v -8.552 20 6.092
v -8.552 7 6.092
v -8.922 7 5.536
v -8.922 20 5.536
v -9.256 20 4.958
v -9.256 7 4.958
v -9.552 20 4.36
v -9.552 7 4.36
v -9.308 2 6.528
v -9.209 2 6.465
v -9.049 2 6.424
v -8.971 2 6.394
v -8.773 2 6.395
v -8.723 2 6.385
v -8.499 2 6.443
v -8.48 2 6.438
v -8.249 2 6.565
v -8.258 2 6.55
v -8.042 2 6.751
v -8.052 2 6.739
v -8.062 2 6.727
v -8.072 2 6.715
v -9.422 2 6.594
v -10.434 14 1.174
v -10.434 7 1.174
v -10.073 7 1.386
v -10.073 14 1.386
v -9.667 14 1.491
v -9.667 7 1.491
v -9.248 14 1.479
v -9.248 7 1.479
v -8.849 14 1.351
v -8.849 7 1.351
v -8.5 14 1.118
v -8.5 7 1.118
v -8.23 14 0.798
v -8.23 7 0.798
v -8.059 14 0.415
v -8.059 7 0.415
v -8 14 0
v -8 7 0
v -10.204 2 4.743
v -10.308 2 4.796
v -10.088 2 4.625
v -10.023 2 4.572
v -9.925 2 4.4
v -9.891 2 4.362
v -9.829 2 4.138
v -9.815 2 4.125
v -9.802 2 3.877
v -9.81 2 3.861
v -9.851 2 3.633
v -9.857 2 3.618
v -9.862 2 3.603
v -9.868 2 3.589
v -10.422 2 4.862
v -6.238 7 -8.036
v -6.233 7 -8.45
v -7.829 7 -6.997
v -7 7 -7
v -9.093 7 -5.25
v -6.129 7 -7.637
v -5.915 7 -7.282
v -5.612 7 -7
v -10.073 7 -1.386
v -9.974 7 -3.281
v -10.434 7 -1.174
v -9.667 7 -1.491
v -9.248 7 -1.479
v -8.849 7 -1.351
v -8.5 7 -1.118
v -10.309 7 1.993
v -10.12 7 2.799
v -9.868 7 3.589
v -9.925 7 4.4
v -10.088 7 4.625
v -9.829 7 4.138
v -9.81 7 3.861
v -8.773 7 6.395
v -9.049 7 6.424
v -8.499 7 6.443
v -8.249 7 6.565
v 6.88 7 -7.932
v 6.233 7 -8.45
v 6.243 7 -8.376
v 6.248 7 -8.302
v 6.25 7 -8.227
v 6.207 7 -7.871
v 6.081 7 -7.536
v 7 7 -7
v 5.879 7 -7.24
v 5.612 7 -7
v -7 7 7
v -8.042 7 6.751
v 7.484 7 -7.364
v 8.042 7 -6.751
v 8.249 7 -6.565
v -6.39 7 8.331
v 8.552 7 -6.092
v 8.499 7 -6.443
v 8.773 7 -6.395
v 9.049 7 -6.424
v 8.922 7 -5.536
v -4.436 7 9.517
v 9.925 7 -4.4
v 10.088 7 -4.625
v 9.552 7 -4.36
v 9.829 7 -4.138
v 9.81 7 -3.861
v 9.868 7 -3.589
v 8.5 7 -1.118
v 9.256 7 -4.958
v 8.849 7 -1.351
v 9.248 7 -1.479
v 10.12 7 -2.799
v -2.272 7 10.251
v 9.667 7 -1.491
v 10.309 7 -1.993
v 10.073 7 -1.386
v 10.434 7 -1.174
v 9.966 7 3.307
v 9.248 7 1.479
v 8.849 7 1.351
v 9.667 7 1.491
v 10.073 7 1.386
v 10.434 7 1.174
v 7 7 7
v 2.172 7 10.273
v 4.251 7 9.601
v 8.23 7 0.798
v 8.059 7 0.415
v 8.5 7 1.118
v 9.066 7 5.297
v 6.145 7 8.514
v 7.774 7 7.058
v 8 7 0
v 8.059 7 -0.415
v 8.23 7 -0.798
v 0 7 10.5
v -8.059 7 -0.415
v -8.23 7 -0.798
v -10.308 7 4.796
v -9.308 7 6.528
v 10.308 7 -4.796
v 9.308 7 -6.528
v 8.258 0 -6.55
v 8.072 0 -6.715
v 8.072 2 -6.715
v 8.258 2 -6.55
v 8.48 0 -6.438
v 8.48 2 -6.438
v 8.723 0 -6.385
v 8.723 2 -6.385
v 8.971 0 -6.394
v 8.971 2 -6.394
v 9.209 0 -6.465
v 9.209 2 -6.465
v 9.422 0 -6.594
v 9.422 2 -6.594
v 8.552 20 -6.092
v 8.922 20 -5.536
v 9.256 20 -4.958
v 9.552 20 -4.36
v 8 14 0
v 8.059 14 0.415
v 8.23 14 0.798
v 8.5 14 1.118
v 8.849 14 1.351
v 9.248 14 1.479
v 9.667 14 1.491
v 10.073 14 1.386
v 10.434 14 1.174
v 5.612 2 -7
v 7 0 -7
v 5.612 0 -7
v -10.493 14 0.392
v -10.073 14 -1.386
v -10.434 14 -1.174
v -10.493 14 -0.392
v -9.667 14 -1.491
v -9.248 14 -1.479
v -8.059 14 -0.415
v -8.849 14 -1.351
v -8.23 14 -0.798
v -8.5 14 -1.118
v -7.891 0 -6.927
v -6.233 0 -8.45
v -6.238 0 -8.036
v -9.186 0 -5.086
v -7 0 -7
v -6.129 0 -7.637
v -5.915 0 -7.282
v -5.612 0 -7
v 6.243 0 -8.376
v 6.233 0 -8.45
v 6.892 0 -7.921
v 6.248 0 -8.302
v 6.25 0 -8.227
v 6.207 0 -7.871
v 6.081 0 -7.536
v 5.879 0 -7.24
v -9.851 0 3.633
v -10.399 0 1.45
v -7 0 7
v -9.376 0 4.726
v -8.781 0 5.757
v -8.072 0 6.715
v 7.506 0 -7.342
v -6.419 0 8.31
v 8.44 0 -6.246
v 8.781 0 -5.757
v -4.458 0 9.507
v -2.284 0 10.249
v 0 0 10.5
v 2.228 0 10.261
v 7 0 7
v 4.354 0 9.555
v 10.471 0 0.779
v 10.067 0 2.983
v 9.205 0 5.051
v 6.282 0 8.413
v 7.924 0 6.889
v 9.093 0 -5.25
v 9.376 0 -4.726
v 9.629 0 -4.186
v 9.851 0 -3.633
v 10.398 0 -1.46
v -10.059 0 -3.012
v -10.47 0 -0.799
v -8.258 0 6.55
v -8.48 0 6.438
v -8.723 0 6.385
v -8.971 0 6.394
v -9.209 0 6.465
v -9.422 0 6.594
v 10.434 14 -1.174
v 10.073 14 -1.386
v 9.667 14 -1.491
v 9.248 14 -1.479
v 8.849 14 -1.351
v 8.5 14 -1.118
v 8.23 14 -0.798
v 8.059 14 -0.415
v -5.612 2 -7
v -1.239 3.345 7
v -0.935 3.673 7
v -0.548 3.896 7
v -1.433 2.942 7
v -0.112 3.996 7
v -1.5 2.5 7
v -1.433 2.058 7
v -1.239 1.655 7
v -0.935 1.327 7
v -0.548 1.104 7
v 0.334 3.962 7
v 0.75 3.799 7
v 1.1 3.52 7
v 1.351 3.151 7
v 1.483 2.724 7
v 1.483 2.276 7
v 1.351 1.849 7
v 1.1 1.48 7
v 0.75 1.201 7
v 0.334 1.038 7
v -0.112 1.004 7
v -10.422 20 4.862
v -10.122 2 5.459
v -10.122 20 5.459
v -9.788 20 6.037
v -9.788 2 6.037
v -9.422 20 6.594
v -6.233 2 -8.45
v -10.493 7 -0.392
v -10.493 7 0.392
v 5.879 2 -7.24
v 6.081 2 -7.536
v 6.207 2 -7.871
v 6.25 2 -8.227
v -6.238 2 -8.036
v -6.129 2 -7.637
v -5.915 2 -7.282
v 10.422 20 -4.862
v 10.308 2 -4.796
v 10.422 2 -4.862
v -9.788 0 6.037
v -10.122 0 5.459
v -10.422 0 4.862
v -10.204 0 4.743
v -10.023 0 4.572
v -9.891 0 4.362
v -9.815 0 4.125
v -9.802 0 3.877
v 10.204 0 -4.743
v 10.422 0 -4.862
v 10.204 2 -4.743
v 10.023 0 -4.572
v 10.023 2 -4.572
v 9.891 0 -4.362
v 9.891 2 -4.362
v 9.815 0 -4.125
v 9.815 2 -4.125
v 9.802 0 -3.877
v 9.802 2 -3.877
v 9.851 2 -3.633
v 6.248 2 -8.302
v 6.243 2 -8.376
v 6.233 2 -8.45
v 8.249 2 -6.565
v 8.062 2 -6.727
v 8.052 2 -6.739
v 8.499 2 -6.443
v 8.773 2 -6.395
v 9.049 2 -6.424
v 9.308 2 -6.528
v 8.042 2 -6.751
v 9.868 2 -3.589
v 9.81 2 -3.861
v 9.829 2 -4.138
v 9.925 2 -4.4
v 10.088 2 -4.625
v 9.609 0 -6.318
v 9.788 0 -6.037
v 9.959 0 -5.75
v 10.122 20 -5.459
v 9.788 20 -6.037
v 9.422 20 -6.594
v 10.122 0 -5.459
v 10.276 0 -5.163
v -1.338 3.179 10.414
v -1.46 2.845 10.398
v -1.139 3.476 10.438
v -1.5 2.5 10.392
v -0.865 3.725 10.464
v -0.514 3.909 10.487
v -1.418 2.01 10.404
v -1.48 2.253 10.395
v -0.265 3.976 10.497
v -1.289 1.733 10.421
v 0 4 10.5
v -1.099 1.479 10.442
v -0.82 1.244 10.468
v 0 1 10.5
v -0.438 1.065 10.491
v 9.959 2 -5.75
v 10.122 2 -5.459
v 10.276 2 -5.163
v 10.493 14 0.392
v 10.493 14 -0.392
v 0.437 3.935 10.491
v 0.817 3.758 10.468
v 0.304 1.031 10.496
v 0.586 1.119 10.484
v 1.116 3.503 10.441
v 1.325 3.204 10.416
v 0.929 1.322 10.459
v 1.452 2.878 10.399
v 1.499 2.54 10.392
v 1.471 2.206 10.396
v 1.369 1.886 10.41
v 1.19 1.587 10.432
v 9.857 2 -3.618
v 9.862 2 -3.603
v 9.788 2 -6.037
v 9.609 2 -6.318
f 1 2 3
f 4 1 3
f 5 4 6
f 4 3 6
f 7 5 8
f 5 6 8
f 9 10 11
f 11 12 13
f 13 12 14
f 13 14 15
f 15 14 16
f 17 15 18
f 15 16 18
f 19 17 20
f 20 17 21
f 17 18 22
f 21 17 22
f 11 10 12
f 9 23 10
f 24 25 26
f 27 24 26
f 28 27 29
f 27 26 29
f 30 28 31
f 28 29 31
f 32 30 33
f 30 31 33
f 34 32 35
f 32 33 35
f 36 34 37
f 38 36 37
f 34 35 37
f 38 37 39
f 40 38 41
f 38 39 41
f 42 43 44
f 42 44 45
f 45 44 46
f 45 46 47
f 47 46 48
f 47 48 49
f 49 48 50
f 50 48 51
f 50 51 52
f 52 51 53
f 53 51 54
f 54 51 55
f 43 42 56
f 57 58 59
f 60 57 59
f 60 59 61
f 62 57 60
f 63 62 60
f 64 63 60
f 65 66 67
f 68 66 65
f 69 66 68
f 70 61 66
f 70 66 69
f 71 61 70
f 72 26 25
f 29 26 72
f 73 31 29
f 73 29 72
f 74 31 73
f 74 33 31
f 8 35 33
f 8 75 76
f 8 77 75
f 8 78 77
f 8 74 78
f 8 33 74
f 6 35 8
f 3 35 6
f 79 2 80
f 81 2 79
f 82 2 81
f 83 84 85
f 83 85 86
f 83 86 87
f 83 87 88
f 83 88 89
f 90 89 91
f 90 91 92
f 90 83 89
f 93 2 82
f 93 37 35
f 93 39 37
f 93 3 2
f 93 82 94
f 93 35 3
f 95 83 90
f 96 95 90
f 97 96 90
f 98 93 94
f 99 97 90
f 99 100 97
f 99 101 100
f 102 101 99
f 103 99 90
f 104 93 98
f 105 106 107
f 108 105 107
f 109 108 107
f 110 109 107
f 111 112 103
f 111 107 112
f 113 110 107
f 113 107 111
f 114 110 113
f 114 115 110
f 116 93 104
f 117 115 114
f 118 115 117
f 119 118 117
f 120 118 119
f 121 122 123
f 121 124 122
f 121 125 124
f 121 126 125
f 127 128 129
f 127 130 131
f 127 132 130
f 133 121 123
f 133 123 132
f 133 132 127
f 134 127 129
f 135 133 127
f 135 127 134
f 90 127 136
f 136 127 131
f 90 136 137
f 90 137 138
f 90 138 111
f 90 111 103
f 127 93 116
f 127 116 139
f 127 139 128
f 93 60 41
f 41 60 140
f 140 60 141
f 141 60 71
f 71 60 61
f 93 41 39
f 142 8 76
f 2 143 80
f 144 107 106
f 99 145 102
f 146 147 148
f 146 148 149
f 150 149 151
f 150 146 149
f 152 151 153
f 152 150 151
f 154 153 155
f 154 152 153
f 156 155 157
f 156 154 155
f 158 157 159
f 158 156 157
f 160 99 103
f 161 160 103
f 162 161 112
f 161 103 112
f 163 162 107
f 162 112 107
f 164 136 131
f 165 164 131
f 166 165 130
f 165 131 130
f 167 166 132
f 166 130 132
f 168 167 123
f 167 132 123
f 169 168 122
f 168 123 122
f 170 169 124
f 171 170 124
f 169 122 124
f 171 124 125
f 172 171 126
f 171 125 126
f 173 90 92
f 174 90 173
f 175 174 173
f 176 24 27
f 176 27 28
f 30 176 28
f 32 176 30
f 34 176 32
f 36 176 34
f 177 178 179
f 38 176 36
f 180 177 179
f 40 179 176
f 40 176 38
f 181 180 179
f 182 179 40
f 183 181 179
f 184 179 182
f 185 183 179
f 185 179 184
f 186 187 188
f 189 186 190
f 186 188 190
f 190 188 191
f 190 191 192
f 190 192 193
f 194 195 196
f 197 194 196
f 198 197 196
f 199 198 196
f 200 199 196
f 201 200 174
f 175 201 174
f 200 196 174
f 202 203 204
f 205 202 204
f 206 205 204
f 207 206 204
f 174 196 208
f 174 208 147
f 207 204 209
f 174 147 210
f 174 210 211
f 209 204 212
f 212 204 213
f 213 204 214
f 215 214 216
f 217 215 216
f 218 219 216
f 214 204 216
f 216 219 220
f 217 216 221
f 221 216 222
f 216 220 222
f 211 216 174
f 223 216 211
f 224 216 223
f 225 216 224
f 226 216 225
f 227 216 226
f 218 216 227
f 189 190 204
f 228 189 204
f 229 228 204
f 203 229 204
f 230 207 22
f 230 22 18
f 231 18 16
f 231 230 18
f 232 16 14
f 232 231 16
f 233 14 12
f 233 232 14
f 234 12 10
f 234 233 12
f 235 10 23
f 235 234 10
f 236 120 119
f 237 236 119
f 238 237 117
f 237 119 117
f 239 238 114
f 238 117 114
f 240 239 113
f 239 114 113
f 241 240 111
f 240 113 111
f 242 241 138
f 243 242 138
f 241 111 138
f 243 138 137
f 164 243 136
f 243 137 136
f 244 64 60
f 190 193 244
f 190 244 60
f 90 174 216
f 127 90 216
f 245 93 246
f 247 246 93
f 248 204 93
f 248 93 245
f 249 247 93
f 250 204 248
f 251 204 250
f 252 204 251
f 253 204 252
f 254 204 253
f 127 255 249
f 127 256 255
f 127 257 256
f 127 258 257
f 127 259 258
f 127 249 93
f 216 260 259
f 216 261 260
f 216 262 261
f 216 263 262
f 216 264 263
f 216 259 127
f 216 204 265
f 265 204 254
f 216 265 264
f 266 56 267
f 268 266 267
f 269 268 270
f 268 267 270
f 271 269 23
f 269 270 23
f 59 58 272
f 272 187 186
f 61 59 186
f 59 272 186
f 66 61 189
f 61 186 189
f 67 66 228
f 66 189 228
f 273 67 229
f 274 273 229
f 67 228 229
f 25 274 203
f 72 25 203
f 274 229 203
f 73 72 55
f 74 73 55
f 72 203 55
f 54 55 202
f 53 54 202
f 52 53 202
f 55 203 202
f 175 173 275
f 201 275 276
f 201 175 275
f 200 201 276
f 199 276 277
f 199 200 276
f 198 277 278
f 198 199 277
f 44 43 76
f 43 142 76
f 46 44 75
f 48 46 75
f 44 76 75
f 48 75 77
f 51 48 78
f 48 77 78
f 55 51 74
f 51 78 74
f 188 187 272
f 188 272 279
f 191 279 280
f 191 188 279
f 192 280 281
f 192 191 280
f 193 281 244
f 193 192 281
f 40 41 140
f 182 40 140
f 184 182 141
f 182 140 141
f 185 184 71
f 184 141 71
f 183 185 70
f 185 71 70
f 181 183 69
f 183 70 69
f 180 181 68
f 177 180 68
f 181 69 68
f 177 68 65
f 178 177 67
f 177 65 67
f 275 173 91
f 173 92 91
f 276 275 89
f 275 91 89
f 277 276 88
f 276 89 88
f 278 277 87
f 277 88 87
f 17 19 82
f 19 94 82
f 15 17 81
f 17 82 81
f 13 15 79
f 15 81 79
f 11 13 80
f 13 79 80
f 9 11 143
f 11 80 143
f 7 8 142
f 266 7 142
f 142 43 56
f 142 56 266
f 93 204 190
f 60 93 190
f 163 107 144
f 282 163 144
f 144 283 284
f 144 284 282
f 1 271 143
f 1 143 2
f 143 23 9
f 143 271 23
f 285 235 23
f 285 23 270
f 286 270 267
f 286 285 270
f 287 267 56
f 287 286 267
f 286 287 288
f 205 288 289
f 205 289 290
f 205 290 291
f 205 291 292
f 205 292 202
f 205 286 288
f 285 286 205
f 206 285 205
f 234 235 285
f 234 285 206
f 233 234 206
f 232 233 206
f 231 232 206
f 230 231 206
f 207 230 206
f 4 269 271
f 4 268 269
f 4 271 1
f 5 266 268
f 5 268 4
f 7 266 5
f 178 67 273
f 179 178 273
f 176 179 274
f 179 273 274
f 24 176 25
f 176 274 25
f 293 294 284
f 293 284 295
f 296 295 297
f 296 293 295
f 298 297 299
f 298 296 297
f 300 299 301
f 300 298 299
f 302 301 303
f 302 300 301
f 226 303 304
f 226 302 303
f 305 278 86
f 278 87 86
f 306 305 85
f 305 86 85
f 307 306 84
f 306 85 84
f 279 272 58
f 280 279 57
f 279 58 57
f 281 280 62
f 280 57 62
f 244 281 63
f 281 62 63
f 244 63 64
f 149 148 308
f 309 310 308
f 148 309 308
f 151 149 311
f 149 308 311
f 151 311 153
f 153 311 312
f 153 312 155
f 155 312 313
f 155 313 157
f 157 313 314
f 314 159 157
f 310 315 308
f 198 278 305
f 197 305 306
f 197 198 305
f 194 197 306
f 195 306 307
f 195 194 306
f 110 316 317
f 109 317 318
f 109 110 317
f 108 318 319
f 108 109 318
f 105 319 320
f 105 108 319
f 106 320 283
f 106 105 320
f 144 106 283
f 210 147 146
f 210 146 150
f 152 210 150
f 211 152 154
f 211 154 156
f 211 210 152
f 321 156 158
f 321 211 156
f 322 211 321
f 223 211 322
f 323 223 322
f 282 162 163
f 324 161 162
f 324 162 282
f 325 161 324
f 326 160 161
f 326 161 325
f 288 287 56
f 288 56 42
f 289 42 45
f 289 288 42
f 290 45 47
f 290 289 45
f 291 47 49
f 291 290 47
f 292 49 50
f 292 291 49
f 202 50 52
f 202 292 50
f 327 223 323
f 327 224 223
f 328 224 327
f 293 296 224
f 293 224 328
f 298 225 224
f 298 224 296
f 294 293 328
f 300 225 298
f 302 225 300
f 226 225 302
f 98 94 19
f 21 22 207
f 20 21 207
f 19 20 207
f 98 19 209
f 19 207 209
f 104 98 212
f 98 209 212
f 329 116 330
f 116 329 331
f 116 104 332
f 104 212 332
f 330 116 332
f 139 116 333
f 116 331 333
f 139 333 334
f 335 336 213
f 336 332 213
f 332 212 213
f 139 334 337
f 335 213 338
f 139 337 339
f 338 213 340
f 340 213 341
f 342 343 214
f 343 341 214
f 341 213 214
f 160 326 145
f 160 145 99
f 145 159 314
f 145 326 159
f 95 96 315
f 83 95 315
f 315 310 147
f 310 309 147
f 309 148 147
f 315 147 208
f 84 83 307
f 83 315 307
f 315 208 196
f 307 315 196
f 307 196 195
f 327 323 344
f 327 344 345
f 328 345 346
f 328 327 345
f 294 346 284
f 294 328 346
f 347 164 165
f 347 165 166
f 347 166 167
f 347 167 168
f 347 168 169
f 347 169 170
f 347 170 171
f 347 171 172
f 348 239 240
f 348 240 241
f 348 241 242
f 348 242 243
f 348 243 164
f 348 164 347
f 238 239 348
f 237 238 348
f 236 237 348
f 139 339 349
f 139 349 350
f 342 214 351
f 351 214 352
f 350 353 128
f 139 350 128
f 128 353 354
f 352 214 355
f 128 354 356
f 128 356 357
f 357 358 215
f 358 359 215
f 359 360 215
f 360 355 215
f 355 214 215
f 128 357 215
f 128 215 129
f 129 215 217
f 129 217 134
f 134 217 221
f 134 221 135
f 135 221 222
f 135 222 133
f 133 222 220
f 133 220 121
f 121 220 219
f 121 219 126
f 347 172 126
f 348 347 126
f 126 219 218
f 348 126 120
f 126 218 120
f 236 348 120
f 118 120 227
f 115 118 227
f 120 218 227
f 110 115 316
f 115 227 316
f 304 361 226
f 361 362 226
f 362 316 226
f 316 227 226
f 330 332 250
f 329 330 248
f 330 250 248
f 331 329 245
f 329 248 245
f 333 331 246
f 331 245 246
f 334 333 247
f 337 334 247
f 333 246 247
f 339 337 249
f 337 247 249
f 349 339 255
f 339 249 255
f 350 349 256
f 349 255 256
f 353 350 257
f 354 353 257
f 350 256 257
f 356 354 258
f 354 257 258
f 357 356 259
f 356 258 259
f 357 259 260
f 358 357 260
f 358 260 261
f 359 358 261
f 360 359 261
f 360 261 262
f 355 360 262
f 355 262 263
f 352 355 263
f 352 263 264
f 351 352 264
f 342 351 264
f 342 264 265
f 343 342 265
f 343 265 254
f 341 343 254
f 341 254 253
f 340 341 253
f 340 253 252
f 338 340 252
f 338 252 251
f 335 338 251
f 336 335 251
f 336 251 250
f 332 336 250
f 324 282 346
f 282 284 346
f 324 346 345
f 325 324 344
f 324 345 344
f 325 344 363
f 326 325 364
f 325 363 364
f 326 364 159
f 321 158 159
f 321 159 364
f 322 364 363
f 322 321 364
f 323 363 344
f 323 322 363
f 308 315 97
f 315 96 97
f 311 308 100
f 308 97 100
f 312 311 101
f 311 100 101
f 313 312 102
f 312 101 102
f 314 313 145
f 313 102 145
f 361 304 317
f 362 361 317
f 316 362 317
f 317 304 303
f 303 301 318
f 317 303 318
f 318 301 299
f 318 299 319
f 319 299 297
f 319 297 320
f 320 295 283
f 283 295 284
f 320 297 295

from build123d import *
from build123d.topology import SkipClean

# Parameters (mm, degrees)
SKETCH1_R               = 10.5
BOSS_EXTRUDE1_DEPTH     = 7
BOSS_EXTRUDE2_DEPTH     = 7
BOSS_EXTRUDE4_START     = -5
BOSS_EXTRUDE4_DEPTH     = 5
SKETCH5_R               = 1.5
CUT_EXTRUDE2_DEPTH      = 5
BOSS_EXTRUDE5_DEPTH     = 13
CUT_EXTRUDE4_DEPTH      = 26.013546021
CUT_EXTRUDE4_DEPTH_BACK = 26.013546021
FILLET1_R               = 1
CUT_EXTRUDE5_DEPTH      = 20.866491554
CUT_EXTRUDE5_DEPTH_BACK = 20.866491554
SKETCH9_R               = 15
SKETCH9_R_2             = 11.5
SKETCH10_R              = 1.5
CUT_EXTRUDE6_DEPTH      = 11.2
CUT_EXTRUDE7_DEPTH      = 24.334523869
CUT_EXTRUDE7_DEPTH_BACK = 24.334523869
SKETCH12_R              = 4.652991158
SKETCH12_R_2            = 1.5
BOSS_EXTRUDE6_START     = 2
BOSS_EXTRUDE6_DEPTH     = 2


with BuildPart() as part:
    # Sketch1 → Boss-Extrude1 (new body)
    with BuildSketch(Plane(origin=(0, 0, 0), x_dir=(1, 0, 0), z_dir=(0, 1, 0))):
        with Locations(Location((0, 0, 0), (0, 0, 270))):
            Circle(SKETCH1_R)
        Polygon((7, -7), (7, 0), (7, 7), (-7, 7), (-7, -7), align=None, mode=Mode.SUBTRACT)
    extrude(amount=BOSS_EXTRUDE1_DEPTH)

    # Sketch2 → Boss-Extrude2 (add)
    with BuildSketch(Plane(origin=(0, 7, 0), x_dir=(1, 0, 0), z_dir=(0, 1, 0))):
        with BuildLine():
            ThreePointArc((-10.434210526, -1.173563246), (-8.848584537, -1.351169084), (-8, 0))
            ThreePointArc((-8, 0), (-8.848584537, 1.351169084), (-10.434210526, 1.173563246))
            ThreePointArc((-10.434210526, 1.173563246), (-10.5, 0), (-10.434210526, -1.173563246))
        make_face()
        with BuildLine():
            ThreePointArc((10.434210526, 1.173563246), (8.848584537, 1.351169084), (8, 0))
            ThreePointArc((8, 0), (8.848584537, -1.351169084), (10.434210526, -1.173563246))
            ThreePointArc((10.434210526, -1.173563246), (10.5, 0), (10.434210526, 1.173563246))
        make_face()
    extrude(amount=BOSS_EXTRUDE2_DEPTH)

    # Sketch4 → Boss-Extrude4 (add)
    with BuildSketch(Plane(origin=(0, 7, 0), x_dir=(1, 0, 0), z_dir=(0, 1, 0)).offset(BOSS_EXTRUDE4_START)):
        with BuildLine():
            Line((-10.392304845, -6), (-9.09326674, -5.25))
            ThreePointArc((-9.09326674, -5.25), (-9.333212128, -4.810525062), (-9.551933495, -4.360110836))
            Line((-9.551933495, -4.360110836), (-10.743718377, -5.048188159))
            ThreePointArc((-10.743718377, -5.048188159), (-10.608541774, -5.539058011), (-10.392304845, -6))
        make_face()
        with BuildLine():
            Line((-9.09326674, -5.25), (-7, -4.041451884))
            Line((-7, -4.041451884), (-7, -2.886751346))
            Line((-7, -2.886751346), (-9.551933495, -4.360110836))
            ThreePointArc((-9.551933495, -4.360110836), (-9.333212128, -4.810525062), (-9.09326674, -5.25))
        make_face()
        with BuildLine():
            Line((-7, -5.196152423), (-7, -4.041451884))
            Line((-7, -4.041451884), (-9.09326674, -5.25))
            ThreePointArc((-9.09326674, -5.25), (-8.832642973, -5.677536271), (-8.551933495, -6.092161644))
            Line((-8.551933495, -6.092161644), (-7, -5.196152423))
        make_face()
        with BuildLine():
            ThreePointArc((-8.551933495, -6.092161644), (-8.832642973, -5.677536271), (-9.09326674, -5.25))
            Line((-9.09326674, -5.25), (-10.392304845, -6))
            ThreePointArc((-10.392304845, -6), (-10.101235838, -6.417737668), (-9.743718377, -6.780238966))
            Line((-9.743718377, -6.780238966), (-8.551933495, -6.092161644))
        make_face()
        with BuildLine():
            ThreePointArc((8.551933495, 6.092161644), (8.832642973, 5.677536271), (9.09326674, 5.25))
            Line((9.09326674, 5.25), (10.392304845, 6))
            ThreePointArc((10.392304845, 6), (10.101235838, 6.417737668), (9.743718377, 6.780238966))
            Line((9.743718377, 6.780238966), (8.551933495, 6.092161644))
        make_face()
        with BuildLine():
            Line((10.392304845, 6), (9.09326674, 5.25))
            ThreePointArc((9.09326674, 5.25), (9.333212128, 4.810525062), (9.551933495, 4.360110836))
            Line((9.551933495, 4.360110836), (10.743718377, 5.048188159))
            ThreePointArc((10.743718377, 5.048188159), (10.608541774, 5.539058011), (10.392304845, 6))
        make_face()
        with BuildLine():
            Line((7, 5.196152423), (7, 4.041451884))
            Line((7, 4.041451884), (9.09326674, 5.25))
            ThreePointArc((9.09326674, 5.25), (8.832642973, 5.677536271), (8.551933495, 6.092161644))
            Line((8.551933495, 6.092161644), (7, 5.196152423))
        make_face()
        with BuildLine():
            Line((9.09326674, 5.25), (7, 4.041451884))
            Line((7, 4.041451884), (7, 2.886751346))
            Line((7, 2.886751346), (9.551933495, 4.360110836))
            ThreePointArc((9.551933495, 4.360110836), (9.333212128, 4.810525062), (9.09326674, 5.25))
        make_face()
    extrude(amount=BOSS_EXTRUDE4_DEPTH)

    # Sketch5 → Cut-Extrude2 (cut)
    with BuildSketch(Plane(origin=(0, 7, 0), x_dir=(1, 0, 0), z_dir=(0, 1, 0))):
        with Locations((4.75, 8.227241336)):
            Circle(SKETCH5_R)
        with Locations((-4.75, 8.227241336)):
            Circle(SKETCH5_R)
    extrude(amount=-CUT_EXTRUDE2_DEPTH, mode=Mode.SUBTRACT)

    # Sketch6 → Boss-Extrude5 (add)
    with BuildSketch(Plane(origin=(0, 7, 0), x_dir=(1, 0, 0), z_dir=(0, 1, 0))):
        with BuildLine():
            Line((-9.551933495, -4.360110836), (-10.743718377, -5.048188159))
            ThreePointArc((-10.743718377, -5.048188159), (-10.392304845, -6), (-9.743718377, -6.780238966))
            Line((-9.743718377, -6.780238966), (-8.551933495, -6.092161644))
            ThreePointArc((-8.551933495, -6.092161644), (-9.09326674, -5.25), (-9.551933495, -4.360110836))
        make_face()
        with BuildLine():
            Line((9.743718377, 6.780238966), (8.551933495, 6.092161644))
            ThreePointArc((8.551933495, 6.092161644), (9.09326674, 5.25), (9.551933495, 4.360110836))
            Line((9.551933495, 4.360110836), (10.743718377, 5.048188159))
            ThreePointArc((10.743718377, 5.048188159), (10.392304845, 6), (9.743718377, 6.780238966))
        make_face()
    extrude(amount=BOSS_EXTRUDE5_DEPTH)

    # Sketch8 → Cut-Extrude4 (cut, two sides: drawn at the far end of the back side and taken through both)
    with BuildSketch(Plane.XY.offset(-CUT_EXTRUDE4_DEPTH_BACK)):
        with BuildLine():
            ThreePointArc((-1.216007768, 2.789525659), (-0.289525659, 1.283992232), (1.216007768, 2.210474341))
            Line((1.216007768, 2.210474341), (-1.216007768, 2.789525659))
        make_face()
        with BuildLine():
            Line((-1.216007768, 2.789525659), (1.216007768, 2.210474341))
            ThreePointArc((1.216007768, 2.210474341), (1.241472857, 2.354242857), (1.25, 2.5))
            ThreePointArc((1.25, 2.5), (0.145757143, 3.741472857), (-1.216007768, 2.789525659))
        make_face()
    extrude(amount=CUT_EXTRUDE4_DEPTH + CUT_EXTRUDE4_DEPTH_BACK, mode=Mode.SUBTRACT)

    # Fillet1
    fillet1_edges = [part.edges().sort_by_distance(p)[0] for p in [
        (-8.551933495, 4.5, 6.092161644),
        (-9.551933495, 4.5, 4.360110836),
        (8.551933495, 4.5, -6.092161644),
        (9.551933495, 4.5, -4.360110836),
    ]]
    fillet(fillet1_edges, radius=FILLET1_R)

    # Sketch9 → Cut-Extrude5 (cut, two sides: drawn at the far end of the back side and taken through both)
    with BuildSketch(Plane(origin=(0, 7, 0), x_dir=(1, 0, 0), z_dir=(0, 1, 0)).offset(-CUT_EXTRUDE5_DEPTH_BACK)):
        Circle(SKETCH9_R)
        Circle(SKETCH9_R_2, mode=Mode.SUBTRACT)
    extrude(amount=CUT_EXTRUDE5_DEPTH + CUT_EXTRUDE5_DEPTH_BACK, mode=Mode.SUBTRACT)

    # Sketch10 → Cut-Extrude6 (cut)
    with BuildSketch(Plane(origin=(0, 0, 7), x_dir=(-1, 0, 0), z_dir=(0, 0, -1))):
        with Locations((0, 2.5)):
            Circle(SKETCH10_R)
    extrude(amount=-CUT_EXTRUDE6_DEPTH, mode=Mode.SUBTRACT)

    # Sketch12 → Cut-Extrude7 (cut, two sides: drawn at the far end of the back side and taken through both)
    with BuildSketch(Plane(origin=(0, 2, 0), x_dir=(1, 0, 0), z_dir=(0, 1, 0)).offset(-CUT_EXTRUDE7_DEPTH_BACK)):
        with Locations((-0.127828636, 8.405111083)):
            Circle(SKETCH12_R)
        with Locations((-4.75, 8.227241336)):
            Circle(SKETCH12_R_2)
        with BuildLine():
            ThreePointArc((4.200769679, 9.623073007), (4.274324476, 9.649820963), (4.349174329, 9.67269586))
            ThreePointArc((4.349174329, 9.67269586), (-0.103811825, 13.058040258), (-4.591507729, 9.718844567))
            ThreePointArc((-4.591507729, 9.718844567), (-3.634711157, 9.23030205), (-3.25, 8.227241336))
            ThreePointArc((-3.25, 8.227241336), (-3.596964938, 7.267809136), (-4.477346862, 6.752229381))
            ThreePointArc((-4.477346862, 6.752229381), (-0.09444048, 3.752239717), (4.244962013, 6.814819079))
            ThreePointArc((4.244962013, 6.814819079), (4.059998471, 6.895363755), (3.887515969, 7))
            ThreePointArc((3.887515969, 7), (3.260583217, 8.405111083), (4.200769679, 9.623073007))
        make_face()
        with BuildLine():
            ThreePointArc((4.525162522, 8.405111083), (4.489847577, 8.977293846), (4.384438802, 9.540791183))
            ThreePointArc((4.384438802, 9.540791183), (4.292801386, 9.582372162), (4.200769679, 9.623073007))
            ThreePointArc((4.200769679, 9.623073007), (3.260583217, 8.405111083), (3.887515969, 7))
            Line((3.887515969, 7), (4.307933932, 7))
            ThreePointArc((4.307933932, 7), (4.470534699, 7.694209294), (4.525162522, 8.405111083))
        make_face()
        with BuildLine():
            ThreePointArc((5.612484031, 7), (6.081113452, 7.535766841), (6.25, 8.227241336))
            ThreePointArc((6.25, 8.227241336), (6.245854483, 8.338683539), (6.233440847, 8.449509761))
            ThreePointArc((6.233440847, 8.449509761), (5.336906018, 9.04253472), (4.384438802, 9.540791183))
            ThreePointArc((4.384438802, 9.540791183), (4.489847577, 8.977293846), (4.525162522, 8.405111083))
            ThreePointArc((4.525162522, 8.405111083), (4.470534699, 7.694209294), (4.307933932, 7))
            Line((4.307933932, 7), (5.612484031, 7))
        make_face()
    extrude(amount=CUT_EXTRUDE7_DEPTH + CUT_EXTRUDE7_DEPTH_BACK, mode=Mode.SUBTRACT)

    # Sketch13 → Boss-Extrude6 (add)
    with SkipClean():  # the faces are left unmerged after this step: merging them gives an invalid solid
        with BuildSketch(Plane.XZ.offset(-2).offset(BOSS_EXTRUDE6_START)):
            with BuildLine():
                ThreePointArc((9.421567416, -6.594245022), (9.699619412, -6.177975661), (9.959292144, -5.75))
                Line((9.959292144, -5.75), (9.09326674, -5.25))
                ThreePointArc((9.09326674, -5.25), (8.613877566, -6.004257929), (8.07208415, -6.715017311))
                ThreePointArc((8.07208415, -6.715017311), (8.722663603, -6.384648227), (9.421567416, -6.594245022))
            make_face()
            with BuildLine():
                Line((9.09326674, -5.25), (9.959292144, -5.75))
                ThreePointArc((9.959292144, -5.75), (10.200093572, -5.311128987), (10.421567416, -4.862194215))
                ThreePointArc((10.421567416, -4.862194215), (9.890599361, -4.361724155), (9.851417653, -3.63312128))
                ThreePointArc((9.851417653, -3.63312128), (9.506778681, -4.457707832), (9.09326674, -5.25))
            make_face()
            with BuildLine():
                ThreePointArc((-10.421567416, 4.862194215), (-9.890599361, 4.361724155), (-9.851417653, 3.63312128))
                ThreePointArc((-9.851417653, 3.63312128), (-9.09326674, 5.25), (-8.07208415, 6.715017311))
                ThreePointArc((-8.07208415, 6.715017311), (-8.722663603, 6.384648227), (-9.421567416, 6.594245022))
                ThreePointArc((-9.421567416, 6.594245022), (-9.959292144, 5.75), (-10.421567416, 4.862194215))
            make_face()
        extrude(amount=-BOSS_EXTRUDE6_DEPTH)


solid = part.part
